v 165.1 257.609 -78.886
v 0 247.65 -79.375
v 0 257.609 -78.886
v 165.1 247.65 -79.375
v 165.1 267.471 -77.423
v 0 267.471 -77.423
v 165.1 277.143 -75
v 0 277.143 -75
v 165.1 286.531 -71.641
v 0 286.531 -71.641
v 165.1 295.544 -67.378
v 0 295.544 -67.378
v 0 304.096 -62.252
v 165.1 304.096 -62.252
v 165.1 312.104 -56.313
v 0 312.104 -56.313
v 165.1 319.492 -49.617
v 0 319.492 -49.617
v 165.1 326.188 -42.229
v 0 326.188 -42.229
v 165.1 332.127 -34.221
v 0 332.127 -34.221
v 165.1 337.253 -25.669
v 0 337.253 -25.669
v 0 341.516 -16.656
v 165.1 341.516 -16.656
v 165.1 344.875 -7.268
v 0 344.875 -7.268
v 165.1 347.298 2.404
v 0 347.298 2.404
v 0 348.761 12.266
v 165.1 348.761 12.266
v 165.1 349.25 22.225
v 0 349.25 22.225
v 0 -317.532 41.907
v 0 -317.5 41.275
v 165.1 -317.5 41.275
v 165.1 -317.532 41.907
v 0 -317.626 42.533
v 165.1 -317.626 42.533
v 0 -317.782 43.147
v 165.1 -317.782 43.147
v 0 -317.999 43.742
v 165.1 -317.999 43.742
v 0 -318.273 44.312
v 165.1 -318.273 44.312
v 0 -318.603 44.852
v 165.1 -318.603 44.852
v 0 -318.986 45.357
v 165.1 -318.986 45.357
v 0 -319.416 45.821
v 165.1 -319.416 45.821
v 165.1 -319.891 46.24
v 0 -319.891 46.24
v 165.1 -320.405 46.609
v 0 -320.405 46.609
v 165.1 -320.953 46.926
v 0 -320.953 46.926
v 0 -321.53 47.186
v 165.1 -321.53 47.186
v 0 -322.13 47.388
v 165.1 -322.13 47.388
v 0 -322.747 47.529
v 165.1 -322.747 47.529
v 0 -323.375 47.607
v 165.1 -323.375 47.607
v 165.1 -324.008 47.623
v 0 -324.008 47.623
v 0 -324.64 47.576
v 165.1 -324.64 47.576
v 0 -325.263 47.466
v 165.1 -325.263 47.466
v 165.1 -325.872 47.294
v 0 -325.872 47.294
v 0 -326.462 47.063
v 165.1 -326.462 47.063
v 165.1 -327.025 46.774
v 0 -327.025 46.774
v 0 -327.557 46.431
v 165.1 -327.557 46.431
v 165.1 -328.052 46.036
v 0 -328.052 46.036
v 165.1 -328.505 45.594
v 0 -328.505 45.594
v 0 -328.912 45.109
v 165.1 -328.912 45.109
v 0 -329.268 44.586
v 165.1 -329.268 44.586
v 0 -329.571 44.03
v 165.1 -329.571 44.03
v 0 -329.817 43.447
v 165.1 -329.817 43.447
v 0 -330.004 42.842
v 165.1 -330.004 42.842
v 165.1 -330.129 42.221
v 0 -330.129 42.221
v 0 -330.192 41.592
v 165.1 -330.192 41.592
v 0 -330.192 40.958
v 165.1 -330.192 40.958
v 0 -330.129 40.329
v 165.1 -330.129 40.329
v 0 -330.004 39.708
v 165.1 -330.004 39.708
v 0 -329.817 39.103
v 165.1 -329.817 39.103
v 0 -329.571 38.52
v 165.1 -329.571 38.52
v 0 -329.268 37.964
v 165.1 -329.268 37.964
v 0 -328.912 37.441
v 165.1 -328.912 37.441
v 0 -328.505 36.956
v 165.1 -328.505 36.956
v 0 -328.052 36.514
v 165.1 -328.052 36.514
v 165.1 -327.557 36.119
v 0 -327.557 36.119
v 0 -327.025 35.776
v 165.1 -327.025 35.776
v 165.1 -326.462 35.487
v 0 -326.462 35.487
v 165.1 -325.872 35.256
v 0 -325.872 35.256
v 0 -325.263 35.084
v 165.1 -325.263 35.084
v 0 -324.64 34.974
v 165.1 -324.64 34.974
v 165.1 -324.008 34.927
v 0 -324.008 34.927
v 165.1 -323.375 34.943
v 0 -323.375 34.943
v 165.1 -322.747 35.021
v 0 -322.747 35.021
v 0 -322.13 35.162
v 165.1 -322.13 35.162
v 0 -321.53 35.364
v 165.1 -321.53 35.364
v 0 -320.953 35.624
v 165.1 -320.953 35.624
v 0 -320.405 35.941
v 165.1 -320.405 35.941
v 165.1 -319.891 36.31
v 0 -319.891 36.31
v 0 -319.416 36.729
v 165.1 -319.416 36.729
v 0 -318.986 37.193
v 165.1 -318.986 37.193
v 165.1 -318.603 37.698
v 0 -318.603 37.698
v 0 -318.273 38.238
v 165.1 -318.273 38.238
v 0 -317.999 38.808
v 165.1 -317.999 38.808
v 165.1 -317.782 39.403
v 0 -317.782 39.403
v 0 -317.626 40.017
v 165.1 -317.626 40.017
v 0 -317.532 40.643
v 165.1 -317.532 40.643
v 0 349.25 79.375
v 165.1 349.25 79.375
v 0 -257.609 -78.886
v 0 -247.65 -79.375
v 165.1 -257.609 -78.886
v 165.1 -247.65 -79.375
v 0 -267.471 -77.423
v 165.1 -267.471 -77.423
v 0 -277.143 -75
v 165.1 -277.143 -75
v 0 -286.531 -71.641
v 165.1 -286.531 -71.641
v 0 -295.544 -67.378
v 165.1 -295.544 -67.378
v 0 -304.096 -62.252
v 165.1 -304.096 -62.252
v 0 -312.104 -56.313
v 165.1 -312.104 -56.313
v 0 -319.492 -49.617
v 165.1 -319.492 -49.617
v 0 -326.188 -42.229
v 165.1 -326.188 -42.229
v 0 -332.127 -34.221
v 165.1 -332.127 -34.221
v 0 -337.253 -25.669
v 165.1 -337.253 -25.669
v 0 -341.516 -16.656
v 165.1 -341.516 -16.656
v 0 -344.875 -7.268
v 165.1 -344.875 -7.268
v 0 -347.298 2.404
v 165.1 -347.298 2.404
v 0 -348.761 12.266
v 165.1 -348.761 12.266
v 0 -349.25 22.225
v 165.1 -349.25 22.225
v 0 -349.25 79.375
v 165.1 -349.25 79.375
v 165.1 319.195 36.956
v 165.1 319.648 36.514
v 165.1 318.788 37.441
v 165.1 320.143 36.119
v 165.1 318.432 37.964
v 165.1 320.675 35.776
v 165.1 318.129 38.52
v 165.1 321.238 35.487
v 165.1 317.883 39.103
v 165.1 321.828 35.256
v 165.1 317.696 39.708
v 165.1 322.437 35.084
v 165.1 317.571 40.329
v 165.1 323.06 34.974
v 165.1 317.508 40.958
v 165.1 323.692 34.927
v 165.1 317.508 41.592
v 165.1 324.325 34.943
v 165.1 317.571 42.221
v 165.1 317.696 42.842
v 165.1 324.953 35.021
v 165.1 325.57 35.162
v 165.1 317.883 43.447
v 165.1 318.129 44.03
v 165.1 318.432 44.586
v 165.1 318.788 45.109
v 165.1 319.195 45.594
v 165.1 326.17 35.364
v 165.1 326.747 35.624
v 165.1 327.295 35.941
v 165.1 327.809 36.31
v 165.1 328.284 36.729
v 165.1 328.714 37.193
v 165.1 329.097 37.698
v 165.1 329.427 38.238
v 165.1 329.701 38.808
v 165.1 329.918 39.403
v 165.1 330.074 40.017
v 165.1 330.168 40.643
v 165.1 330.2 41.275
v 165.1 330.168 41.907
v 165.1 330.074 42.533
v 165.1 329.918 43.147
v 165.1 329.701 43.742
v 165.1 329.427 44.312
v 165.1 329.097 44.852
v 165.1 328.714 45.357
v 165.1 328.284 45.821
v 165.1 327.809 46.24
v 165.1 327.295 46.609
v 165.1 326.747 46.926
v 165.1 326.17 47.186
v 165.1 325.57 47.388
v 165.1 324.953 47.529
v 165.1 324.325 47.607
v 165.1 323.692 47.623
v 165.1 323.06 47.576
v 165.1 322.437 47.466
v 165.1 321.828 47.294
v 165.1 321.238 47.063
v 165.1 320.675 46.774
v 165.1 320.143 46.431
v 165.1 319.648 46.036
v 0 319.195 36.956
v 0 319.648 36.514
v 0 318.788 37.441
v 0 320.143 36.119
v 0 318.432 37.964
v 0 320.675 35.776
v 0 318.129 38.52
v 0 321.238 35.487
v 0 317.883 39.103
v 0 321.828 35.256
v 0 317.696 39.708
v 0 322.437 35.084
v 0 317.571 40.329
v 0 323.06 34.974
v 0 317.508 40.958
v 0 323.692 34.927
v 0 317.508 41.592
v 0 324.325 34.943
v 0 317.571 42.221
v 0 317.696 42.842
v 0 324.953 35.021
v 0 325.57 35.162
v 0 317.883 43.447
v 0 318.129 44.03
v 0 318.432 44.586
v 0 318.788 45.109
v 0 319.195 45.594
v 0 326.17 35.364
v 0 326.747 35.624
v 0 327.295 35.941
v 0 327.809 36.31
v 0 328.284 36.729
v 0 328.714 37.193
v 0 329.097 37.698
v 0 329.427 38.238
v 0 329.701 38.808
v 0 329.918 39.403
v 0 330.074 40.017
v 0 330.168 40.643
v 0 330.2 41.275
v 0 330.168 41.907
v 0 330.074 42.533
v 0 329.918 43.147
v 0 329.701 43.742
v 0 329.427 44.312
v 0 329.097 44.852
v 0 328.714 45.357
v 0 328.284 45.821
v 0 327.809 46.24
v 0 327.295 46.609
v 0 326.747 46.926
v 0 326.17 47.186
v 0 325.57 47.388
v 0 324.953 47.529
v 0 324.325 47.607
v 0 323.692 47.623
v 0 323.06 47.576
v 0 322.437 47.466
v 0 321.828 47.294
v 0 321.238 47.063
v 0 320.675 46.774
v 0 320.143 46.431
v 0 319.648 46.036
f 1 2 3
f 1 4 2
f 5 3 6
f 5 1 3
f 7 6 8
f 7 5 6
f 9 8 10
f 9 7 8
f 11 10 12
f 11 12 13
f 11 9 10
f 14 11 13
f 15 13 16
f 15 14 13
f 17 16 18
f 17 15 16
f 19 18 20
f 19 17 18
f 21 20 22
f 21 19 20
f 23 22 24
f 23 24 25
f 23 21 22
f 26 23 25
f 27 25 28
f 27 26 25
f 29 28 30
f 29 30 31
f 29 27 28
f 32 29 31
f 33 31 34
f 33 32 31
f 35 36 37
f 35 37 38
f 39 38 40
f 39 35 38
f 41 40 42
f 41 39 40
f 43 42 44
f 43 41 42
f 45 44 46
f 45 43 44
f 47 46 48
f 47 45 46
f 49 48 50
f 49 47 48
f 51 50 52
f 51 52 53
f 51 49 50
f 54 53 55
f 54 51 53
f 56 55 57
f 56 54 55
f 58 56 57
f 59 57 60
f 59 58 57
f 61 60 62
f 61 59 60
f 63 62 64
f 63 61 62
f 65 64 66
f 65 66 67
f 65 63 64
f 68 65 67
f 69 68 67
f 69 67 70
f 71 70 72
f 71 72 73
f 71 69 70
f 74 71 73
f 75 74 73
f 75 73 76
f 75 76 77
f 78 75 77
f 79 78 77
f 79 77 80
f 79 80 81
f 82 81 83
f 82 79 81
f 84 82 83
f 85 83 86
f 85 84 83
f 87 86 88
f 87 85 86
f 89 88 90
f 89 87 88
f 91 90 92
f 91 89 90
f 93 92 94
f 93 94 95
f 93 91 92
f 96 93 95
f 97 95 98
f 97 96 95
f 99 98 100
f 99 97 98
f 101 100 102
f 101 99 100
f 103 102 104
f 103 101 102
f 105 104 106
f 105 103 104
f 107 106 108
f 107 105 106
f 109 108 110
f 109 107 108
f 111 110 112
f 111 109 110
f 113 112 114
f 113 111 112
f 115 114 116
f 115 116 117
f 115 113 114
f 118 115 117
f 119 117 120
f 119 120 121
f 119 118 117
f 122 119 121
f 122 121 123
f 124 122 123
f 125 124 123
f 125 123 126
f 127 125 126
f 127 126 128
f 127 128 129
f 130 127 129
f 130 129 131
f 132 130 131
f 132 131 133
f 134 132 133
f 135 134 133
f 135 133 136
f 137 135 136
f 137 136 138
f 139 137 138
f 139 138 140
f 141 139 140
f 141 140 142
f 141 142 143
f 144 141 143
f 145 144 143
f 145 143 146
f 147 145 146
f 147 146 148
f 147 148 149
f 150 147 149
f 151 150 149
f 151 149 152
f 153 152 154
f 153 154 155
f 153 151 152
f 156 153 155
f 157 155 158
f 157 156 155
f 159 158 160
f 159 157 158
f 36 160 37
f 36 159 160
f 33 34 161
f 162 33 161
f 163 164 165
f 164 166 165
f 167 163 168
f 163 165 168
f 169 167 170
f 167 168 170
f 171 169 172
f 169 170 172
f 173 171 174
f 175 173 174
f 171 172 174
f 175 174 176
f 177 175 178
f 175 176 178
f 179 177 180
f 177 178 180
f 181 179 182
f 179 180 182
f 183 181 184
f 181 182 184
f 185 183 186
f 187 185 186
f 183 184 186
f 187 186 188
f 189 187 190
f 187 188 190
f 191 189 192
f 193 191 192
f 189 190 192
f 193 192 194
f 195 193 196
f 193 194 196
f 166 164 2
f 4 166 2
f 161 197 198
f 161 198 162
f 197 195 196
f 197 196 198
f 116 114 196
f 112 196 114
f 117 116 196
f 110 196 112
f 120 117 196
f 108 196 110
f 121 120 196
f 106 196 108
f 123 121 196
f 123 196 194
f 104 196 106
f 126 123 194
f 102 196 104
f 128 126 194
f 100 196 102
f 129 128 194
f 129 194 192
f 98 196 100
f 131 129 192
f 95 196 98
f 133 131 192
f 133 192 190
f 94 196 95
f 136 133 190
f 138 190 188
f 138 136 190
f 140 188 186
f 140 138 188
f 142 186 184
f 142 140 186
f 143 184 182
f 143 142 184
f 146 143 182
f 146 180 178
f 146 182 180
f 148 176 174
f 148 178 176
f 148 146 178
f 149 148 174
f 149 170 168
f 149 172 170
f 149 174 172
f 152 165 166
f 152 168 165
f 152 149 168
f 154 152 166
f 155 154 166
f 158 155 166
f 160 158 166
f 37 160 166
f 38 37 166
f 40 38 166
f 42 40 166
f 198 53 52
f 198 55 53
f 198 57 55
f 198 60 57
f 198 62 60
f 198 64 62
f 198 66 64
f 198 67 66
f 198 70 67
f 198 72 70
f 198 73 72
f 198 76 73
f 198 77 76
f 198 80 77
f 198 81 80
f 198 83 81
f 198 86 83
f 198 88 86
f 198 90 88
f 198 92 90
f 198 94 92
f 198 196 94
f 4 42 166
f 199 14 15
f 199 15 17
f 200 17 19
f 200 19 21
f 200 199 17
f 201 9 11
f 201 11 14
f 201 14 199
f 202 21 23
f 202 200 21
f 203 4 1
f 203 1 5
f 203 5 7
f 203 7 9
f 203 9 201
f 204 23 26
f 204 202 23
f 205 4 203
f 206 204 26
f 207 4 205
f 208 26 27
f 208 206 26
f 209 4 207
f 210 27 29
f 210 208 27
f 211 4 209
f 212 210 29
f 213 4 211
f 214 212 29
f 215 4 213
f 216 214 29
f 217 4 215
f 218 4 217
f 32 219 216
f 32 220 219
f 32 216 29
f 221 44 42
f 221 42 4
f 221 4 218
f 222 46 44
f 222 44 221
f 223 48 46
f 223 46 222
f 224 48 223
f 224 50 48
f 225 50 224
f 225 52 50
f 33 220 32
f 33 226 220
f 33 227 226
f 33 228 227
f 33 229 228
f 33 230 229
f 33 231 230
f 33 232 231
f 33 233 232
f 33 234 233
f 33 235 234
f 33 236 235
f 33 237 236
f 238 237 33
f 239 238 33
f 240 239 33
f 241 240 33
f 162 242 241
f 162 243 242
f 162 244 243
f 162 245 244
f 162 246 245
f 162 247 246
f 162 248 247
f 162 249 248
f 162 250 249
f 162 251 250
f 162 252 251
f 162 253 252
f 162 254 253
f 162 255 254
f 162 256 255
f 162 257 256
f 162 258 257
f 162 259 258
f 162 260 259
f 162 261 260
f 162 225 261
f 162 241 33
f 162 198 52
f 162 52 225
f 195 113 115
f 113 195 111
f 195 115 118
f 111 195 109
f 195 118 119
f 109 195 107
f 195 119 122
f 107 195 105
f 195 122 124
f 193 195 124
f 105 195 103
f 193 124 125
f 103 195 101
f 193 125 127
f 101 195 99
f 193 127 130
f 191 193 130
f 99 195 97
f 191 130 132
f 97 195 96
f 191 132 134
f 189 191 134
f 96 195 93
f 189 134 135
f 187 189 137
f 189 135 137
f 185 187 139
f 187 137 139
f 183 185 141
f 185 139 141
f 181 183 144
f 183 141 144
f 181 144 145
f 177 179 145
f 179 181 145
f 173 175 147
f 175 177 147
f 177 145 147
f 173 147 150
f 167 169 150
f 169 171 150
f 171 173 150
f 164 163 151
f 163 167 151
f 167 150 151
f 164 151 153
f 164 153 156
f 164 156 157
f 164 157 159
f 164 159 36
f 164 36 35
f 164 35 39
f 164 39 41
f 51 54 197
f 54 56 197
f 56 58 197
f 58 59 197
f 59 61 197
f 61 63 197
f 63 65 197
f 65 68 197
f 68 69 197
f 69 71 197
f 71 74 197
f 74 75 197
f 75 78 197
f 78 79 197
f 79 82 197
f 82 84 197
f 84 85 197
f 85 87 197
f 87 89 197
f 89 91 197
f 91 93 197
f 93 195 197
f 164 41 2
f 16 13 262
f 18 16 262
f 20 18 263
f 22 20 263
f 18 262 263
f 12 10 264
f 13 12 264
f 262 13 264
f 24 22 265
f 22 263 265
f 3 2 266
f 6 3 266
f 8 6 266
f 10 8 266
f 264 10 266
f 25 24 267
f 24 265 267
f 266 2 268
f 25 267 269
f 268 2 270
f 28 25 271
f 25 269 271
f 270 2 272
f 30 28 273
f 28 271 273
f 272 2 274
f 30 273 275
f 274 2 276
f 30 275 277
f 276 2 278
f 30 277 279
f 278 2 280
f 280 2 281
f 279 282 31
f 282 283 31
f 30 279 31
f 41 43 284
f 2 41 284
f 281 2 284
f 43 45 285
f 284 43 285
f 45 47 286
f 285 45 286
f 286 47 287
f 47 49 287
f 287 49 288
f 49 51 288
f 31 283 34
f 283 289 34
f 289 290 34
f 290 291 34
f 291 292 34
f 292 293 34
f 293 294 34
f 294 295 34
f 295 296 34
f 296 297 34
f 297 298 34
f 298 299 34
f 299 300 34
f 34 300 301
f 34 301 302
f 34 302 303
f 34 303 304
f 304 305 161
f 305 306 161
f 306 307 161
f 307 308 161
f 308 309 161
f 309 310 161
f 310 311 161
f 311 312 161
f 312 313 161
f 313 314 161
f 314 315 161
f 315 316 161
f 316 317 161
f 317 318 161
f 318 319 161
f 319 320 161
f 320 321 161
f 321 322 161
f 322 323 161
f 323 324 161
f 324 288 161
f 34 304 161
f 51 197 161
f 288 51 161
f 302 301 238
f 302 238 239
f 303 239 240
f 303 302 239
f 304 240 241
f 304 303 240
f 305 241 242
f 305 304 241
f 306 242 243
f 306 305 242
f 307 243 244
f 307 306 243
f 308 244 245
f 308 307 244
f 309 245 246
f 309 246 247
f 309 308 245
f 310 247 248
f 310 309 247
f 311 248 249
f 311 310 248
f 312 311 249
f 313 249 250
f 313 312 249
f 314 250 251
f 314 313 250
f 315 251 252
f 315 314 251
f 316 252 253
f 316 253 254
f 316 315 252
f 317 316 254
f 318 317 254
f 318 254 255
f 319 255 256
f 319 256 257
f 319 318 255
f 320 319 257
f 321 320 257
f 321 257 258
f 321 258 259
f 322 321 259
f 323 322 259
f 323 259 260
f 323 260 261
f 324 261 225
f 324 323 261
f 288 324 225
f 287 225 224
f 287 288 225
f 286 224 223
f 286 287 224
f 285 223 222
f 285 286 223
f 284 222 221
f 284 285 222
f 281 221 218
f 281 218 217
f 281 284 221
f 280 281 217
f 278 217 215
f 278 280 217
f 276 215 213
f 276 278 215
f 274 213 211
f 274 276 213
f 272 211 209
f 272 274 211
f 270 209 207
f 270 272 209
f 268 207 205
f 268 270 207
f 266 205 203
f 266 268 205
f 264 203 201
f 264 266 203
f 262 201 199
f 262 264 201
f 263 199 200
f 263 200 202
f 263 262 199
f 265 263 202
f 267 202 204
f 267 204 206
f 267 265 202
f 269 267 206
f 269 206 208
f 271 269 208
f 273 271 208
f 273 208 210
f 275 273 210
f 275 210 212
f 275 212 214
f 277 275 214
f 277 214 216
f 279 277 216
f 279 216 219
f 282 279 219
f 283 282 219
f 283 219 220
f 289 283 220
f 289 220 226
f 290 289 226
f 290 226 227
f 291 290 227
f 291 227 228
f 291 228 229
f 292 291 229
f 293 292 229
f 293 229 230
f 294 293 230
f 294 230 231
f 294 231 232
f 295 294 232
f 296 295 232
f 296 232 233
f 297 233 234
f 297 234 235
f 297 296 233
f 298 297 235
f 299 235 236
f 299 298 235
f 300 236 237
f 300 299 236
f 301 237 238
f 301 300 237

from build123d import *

# Parameters (mm, degrees)
F0_W     = 698.5
F0_H     = 158.75
F0_R     = 6.35
F1_DEPTH = 165.1
F2_R     = 101.6
F3_R     = 101.6


with BuildPart() as f1:
    # F0 (on Right) → F1 (new body)
    with BuildSketch(Plane.YZ):
        Rectangle(F0_W, F0_H)
        with Locations((-323.85, 41.275)):
            Circle(F0_R, mode=Mode.SUBTRACT)
        with Locations((323.85, 41.275)):
            Circle(F0_R, mode=Mode.SUBTRACT)
    extrude(amount=F1_DEPTH)

    # F2
    f2_edges = [f1.edges().sort_by_distance(p)[0] for p in [
        (82.55, 349.25, -79.375),
    ]]
    fillet(f2_edges, radius=F2_R)

    # F3
    f3_edges = [f1.edges().sort_by_distance(p)[0] for p in [
        (82.55, -349.25, -79.375),
    ]]
    fillet(f3_edges, radius=F3_R)


solid = f1.part
